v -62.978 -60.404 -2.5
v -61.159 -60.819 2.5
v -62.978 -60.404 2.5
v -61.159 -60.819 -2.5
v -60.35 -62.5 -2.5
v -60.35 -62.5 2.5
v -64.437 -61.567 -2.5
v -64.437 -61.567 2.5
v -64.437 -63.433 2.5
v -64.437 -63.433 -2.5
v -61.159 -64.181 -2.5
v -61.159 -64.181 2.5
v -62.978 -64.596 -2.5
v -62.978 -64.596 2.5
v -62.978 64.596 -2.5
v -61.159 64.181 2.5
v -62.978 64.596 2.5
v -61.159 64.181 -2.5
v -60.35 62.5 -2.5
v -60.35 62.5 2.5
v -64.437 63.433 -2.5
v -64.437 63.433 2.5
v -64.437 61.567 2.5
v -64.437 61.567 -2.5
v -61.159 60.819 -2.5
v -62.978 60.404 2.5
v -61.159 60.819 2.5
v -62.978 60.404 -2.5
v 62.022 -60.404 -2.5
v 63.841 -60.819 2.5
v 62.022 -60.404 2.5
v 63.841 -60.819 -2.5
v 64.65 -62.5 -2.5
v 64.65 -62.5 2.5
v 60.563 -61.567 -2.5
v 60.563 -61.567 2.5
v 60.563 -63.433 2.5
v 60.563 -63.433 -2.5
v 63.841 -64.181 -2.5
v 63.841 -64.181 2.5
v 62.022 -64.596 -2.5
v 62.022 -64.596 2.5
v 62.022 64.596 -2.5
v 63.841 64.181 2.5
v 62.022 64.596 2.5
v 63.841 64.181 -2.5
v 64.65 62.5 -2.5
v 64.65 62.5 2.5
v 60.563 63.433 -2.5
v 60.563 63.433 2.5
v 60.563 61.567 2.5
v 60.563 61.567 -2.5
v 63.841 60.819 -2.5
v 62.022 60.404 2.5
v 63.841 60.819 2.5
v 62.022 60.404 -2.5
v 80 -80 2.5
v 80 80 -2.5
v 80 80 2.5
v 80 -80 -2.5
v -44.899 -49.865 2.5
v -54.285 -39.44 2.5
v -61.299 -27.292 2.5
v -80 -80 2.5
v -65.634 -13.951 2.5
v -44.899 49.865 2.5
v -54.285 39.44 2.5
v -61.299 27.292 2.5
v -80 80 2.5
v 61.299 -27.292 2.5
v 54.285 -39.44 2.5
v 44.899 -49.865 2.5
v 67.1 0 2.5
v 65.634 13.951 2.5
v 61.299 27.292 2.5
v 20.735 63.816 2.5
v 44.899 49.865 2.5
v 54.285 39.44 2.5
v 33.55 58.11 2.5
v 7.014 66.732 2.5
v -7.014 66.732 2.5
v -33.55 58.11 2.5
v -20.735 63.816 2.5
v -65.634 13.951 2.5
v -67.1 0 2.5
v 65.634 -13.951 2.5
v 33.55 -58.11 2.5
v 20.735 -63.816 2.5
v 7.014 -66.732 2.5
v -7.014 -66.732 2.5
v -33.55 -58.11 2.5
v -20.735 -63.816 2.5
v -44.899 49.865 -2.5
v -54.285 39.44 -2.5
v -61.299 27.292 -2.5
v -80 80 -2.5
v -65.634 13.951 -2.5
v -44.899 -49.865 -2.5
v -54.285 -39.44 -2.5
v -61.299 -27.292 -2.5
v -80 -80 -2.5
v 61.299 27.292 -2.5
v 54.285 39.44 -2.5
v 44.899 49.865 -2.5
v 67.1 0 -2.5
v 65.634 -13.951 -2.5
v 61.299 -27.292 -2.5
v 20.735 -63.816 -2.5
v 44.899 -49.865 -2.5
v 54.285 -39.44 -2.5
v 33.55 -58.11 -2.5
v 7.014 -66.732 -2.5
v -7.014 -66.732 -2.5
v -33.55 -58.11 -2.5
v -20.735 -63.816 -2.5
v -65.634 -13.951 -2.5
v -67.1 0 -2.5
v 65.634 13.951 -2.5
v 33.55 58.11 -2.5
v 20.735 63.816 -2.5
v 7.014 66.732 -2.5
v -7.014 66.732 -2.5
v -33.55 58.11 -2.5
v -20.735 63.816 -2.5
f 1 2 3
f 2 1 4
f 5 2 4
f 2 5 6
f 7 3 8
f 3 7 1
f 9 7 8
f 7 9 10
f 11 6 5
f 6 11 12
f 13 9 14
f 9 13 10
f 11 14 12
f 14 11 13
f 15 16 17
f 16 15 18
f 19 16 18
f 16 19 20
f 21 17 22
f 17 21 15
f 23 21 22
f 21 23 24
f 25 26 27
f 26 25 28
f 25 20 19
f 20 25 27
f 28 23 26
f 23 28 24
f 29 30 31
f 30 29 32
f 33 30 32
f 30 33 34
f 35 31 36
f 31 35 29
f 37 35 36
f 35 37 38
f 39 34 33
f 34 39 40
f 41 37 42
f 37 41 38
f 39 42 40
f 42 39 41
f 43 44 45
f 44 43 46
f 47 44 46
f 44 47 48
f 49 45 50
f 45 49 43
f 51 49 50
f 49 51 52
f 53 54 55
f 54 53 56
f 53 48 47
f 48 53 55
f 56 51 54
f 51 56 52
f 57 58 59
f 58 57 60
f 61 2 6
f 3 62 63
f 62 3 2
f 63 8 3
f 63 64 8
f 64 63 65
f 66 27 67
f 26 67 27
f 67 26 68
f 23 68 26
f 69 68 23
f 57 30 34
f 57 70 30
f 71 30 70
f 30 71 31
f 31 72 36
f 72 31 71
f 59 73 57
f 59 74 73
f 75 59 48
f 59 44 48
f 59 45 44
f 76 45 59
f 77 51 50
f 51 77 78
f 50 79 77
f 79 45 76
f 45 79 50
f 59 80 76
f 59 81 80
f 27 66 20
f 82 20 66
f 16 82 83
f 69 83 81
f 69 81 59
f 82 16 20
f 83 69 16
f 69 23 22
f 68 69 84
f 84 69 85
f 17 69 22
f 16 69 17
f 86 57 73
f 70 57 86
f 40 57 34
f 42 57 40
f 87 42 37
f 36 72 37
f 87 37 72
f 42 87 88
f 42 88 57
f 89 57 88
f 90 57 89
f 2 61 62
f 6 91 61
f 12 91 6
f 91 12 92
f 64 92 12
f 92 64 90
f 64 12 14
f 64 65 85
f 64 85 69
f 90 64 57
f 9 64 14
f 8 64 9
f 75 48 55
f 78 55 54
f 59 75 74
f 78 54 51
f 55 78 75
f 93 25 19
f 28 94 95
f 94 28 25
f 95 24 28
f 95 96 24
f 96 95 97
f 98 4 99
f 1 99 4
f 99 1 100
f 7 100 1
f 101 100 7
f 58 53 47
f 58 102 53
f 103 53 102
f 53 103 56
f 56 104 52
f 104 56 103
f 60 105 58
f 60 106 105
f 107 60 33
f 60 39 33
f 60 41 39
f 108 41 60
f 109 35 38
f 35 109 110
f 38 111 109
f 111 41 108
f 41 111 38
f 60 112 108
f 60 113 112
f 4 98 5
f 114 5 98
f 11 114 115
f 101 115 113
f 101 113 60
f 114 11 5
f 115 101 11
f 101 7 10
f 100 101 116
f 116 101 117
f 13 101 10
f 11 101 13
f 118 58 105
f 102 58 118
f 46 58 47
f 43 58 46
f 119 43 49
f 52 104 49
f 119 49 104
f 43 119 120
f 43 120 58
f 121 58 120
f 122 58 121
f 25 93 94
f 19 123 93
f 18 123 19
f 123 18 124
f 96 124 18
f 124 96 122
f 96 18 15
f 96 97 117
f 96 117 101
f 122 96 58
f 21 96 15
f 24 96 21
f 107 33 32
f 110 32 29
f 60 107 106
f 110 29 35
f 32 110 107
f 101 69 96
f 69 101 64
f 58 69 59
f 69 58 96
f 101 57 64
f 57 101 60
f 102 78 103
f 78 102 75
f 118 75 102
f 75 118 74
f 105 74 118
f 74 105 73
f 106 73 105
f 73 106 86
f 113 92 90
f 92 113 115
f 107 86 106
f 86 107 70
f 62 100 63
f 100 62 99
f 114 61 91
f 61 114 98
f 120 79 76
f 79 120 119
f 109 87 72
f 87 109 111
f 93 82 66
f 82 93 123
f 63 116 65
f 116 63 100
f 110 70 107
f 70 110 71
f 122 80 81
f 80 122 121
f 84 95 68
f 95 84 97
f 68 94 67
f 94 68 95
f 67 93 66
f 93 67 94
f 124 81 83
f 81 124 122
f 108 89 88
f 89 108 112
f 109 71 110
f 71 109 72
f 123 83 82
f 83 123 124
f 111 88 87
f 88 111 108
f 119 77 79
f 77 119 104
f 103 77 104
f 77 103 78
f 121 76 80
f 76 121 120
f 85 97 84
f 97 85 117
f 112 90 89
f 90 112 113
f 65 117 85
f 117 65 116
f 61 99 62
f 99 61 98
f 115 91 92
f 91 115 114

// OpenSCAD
// Arctic P140 dimensions:
FAN_CASE_Y = 140; 
FAN_CASE_X = 140; 
FAN_DIAM = 134.2; 
FAN_SCREW_X = 125.; 
FAN_SCREW_Y = 125.;
FAN_SCREW_OD = 4.3; 

// Filter dimensions
// 20x20x2
// 508 x 508 x 50.8
// 508/3 = 169.3

// Plate dimensions
PLATE_Z = 5; // Thickness
PLATE_X = FAN_CASE_X + 20; 
PLATE_Y = FAN_CASE_Y + 20; 

// infinitedistance
INFINITY = 1000000; 

// create the plate
difference(){
    cube([PLATE_X, PLATE_Y, PLATE_Z], true);
    cylinder(h=INFINITY, r=FAN_DIAM/2., center=true );
    for (ii=[-1,1]){
        for (jj=[-1,1]) {
            translate([ii*FAN_SCREW_X/2, jj*FAN_SCREW_Y/2, 0,]) cylinder(h=INFINITY, r=FAN_SCREW_OD/2, center=true);
        }
    }
}
